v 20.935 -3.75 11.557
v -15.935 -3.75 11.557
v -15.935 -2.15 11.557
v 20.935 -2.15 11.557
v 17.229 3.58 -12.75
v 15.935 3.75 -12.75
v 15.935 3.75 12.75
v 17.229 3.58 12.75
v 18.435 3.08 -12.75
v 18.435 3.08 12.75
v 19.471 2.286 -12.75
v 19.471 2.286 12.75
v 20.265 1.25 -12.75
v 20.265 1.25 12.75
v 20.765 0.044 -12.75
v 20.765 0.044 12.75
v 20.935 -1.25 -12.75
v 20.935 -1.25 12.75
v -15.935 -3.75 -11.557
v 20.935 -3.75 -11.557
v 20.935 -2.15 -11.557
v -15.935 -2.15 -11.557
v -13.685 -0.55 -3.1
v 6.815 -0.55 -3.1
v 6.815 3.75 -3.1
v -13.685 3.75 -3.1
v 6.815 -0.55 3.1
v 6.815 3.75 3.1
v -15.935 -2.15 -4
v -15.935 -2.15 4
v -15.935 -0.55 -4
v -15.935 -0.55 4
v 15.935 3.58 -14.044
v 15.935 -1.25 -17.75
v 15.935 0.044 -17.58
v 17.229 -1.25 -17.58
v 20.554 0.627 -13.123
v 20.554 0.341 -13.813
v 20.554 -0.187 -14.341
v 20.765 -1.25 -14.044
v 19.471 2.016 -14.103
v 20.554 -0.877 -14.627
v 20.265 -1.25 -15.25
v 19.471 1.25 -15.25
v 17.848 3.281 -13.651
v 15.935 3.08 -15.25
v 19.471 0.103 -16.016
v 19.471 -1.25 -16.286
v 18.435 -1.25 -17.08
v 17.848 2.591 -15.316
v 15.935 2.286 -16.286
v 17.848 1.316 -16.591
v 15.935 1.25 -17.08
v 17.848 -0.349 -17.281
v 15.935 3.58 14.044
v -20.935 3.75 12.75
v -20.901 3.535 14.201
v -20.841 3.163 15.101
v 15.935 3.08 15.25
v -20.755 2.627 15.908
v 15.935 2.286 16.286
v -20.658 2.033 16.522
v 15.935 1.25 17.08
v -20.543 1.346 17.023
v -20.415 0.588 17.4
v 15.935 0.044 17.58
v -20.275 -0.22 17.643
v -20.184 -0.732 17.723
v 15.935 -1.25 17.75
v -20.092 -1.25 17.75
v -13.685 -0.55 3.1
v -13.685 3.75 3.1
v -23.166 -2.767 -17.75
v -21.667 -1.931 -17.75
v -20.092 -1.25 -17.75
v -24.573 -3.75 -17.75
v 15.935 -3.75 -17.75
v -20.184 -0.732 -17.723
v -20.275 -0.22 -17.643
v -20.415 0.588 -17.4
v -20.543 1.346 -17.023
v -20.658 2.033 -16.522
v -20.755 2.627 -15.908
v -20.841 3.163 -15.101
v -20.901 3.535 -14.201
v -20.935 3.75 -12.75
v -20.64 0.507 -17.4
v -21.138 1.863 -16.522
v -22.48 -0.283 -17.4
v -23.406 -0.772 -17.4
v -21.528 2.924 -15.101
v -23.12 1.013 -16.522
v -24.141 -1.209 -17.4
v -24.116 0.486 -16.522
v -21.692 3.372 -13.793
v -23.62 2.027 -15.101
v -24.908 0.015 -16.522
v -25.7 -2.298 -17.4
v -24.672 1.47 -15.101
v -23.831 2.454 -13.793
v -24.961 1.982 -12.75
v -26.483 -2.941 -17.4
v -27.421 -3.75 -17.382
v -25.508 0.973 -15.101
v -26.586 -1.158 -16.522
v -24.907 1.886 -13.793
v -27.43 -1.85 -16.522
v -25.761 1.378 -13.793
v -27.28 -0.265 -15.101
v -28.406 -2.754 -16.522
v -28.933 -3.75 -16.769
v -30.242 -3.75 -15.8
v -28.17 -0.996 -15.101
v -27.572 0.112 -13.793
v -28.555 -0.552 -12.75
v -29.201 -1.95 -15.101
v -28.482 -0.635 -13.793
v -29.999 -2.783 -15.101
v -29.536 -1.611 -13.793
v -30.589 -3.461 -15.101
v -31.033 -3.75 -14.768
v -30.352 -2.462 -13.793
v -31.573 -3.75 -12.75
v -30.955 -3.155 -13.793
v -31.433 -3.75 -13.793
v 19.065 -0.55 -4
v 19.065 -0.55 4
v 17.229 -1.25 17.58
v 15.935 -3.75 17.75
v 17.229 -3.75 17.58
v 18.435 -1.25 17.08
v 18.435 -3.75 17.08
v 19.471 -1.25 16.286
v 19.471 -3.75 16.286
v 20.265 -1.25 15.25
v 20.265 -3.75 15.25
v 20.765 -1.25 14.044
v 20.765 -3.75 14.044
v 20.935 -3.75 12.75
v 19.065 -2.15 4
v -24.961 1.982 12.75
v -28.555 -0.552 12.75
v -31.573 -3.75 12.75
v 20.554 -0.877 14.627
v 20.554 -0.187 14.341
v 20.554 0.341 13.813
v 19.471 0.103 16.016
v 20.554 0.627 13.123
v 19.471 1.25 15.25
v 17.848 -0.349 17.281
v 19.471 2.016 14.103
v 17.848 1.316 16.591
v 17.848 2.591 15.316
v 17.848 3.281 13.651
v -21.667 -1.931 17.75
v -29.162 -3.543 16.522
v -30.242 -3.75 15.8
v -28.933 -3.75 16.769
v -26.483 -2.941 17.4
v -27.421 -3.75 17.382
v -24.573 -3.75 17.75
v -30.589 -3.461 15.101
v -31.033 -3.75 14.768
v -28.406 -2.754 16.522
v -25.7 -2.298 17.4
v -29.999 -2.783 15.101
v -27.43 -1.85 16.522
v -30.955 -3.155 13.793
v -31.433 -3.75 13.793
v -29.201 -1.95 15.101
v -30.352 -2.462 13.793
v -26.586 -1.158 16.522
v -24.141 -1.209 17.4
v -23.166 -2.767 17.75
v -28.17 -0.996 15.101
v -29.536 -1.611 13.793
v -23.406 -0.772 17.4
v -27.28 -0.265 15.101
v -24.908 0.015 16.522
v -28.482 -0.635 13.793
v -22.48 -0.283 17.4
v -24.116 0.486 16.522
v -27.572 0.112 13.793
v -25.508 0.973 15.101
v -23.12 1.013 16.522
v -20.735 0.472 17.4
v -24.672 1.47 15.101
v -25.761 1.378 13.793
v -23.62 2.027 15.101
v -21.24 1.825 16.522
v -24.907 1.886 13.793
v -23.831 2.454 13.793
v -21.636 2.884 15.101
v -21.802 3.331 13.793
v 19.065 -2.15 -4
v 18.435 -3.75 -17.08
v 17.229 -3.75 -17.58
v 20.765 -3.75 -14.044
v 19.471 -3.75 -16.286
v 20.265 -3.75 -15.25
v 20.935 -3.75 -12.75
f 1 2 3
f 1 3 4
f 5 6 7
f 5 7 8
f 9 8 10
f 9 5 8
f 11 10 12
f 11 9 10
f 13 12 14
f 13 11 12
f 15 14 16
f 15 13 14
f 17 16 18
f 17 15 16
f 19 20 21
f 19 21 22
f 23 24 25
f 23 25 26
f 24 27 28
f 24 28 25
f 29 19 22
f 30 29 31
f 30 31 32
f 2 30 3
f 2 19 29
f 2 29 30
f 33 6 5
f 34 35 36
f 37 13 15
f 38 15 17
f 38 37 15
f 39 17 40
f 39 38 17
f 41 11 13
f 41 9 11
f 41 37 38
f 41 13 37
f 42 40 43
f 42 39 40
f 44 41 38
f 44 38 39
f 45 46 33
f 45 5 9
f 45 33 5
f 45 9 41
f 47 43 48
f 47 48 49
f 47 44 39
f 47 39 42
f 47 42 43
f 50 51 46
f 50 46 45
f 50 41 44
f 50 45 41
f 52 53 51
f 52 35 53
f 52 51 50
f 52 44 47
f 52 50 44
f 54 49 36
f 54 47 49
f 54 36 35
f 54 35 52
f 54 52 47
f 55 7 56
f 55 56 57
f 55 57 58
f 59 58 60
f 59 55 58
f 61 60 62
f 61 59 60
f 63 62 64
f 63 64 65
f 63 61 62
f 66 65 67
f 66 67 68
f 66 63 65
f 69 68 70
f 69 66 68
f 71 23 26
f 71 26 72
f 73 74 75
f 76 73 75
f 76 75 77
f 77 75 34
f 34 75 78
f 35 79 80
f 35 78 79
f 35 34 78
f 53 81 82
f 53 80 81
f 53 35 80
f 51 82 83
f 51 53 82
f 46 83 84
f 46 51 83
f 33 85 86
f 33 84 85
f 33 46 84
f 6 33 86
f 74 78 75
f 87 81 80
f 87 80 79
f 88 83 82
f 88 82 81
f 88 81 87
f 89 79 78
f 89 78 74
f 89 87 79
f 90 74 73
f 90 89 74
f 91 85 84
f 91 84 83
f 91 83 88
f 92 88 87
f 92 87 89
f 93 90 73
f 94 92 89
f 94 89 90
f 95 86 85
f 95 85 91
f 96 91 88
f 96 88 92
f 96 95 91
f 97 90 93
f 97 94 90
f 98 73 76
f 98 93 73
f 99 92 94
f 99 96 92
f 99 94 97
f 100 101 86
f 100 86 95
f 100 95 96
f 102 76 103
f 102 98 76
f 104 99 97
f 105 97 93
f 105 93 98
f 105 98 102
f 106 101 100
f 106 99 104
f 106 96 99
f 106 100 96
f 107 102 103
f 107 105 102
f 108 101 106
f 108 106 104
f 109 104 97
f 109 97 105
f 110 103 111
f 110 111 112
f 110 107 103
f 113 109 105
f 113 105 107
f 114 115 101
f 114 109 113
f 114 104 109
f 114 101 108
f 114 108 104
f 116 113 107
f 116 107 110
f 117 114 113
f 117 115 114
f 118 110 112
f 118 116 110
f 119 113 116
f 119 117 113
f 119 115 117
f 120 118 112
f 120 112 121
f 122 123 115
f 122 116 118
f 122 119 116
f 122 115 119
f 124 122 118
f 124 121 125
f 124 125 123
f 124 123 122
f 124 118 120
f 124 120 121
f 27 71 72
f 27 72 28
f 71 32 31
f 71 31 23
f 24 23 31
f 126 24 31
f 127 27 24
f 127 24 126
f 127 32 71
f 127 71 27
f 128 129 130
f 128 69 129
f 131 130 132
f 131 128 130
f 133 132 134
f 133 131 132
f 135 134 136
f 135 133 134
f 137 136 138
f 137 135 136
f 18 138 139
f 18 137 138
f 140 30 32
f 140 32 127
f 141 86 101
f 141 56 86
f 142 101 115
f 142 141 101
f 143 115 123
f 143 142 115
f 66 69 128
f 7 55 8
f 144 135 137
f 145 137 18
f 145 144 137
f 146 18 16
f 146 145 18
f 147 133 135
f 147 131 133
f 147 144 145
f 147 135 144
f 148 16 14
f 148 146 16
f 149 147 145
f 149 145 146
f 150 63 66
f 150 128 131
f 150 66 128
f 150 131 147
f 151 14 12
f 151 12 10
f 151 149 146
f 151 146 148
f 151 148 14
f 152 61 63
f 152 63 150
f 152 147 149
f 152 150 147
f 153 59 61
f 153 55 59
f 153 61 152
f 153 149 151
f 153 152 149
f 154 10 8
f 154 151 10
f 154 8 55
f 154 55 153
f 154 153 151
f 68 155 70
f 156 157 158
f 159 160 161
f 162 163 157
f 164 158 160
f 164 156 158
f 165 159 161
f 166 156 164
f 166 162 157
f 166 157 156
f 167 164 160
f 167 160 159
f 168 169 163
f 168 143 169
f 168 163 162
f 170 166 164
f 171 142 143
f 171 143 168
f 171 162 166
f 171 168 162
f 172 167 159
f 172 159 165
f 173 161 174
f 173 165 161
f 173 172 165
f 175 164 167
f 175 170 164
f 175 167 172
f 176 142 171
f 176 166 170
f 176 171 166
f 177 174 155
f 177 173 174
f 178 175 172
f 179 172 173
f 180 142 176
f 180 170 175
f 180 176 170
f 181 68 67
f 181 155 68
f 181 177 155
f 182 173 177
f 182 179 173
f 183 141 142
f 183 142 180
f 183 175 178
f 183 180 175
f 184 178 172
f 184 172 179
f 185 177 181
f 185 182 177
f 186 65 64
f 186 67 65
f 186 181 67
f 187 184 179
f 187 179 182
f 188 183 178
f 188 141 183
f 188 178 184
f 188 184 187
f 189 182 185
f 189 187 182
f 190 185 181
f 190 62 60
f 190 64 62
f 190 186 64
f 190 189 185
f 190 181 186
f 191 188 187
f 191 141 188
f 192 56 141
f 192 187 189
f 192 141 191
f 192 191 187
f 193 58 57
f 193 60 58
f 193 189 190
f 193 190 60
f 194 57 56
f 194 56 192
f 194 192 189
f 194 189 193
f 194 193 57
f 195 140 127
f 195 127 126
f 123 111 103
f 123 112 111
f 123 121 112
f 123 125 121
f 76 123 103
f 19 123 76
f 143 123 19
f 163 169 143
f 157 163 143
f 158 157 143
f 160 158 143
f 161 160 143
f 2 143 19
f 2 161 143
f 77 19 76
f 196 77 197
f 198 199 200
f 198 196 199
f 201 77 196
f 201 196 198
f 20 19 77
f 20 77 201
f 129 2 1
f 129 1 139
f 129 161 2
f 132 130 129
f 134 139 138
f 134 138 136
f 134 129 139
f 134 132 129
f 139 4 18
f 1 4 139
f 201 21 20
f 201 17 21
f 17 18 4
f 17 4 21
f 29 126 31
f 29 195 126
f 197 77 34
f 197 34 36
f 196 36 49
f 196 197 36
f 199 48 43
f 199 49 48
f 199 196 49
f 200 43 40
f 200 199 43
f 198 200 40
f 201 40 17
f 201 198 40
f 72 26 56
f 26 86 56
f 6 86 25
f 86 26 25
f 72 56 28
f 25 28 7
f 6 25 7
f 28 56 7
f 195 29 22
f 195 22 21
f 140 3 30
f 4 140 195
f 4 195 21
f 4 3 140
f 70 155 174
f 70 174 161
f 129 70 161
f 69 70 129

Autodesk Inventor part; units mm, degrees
ref_plane "YZ Plane" through (0, 0, 0) normal (1, 0, 0) x (0, 1, 0)
ref_plane "XZ Plane" through (0, 0, 0) normal (0, 1, 0) x (-1, 0, 0)
ref_plane "XY Plane" through (0, 0, 0) normal (0, 0, 1) x (1, 0, 0)
sketch "Sketch1" plane through (0, 0, 0) normal (0, 0, 1) x (1, 0, 0)
  line L0 (-20.935, 3.75) -> (20.935, 3.75)
  line L1 (20.935, 3.75) -> (20.935, -3.75)
  line L2 (20.935, -3.75) -> (-20.935, -3.75)
  line L3 (-20.935, -3.75) -> (-20.935, 3.75)
  line L4 (-20.935, 3.75) -> (20.935, -3.75) construction
  line L5 (20.935, 3.75) -> (-20.935, -3.75) construction
  point P0 (0, 0)
  dimension "d0" = 41.87
  dimension "d1" = 7.5
extrude "Extrusion1" add sketch "Sketch1" along normal mid plane 35.5
sketch "Sketch2" plane through (-20.935, -3.75, 17.75) normal (0, -1, 0) x (1, 0, 0)
  line L0 (0, -35.5) -> (0, 0) projected
  line L1 (0, -35.5) -> (0, -29.307)
  line L2 (0, -29.307) -> (5, -29.307)
  line L3 (5, -29.307) -> (5, -6.193)
  line L4 (5, -6.193) -> (41.87, -6.193)
  line L5 (41.87, -6.193) -> (41.87, -29.307)
  line L6 (41.87, -29.307) -> (5, -29.307)
  point P0 (20.935, -17.75)
  dimension "d4" = 6.193
  dimension "d5" = 5
  dimension "d6" = 23.114
  dimension "d7" = 36.87
extrude "Extrusion2" cut sketch "Sketch2" against normal blind 1.6
sketch "Sketch3" plane through (-20.935, -2.15, 17.75) normal (0, -1, 0) x (1, 0, 0)
  line L0 (5, -29.307) -> (5, -6.193) projected
  line L1 (5, -29.307) -> (5, -21.75)
  line L2 (5, -21.75) -> (5, -13.75)
  line L3 (5, -13.75) -> (40, -13.75)
  line L4 (40, -13.75) -> (40, -21.75)
  line L5 (40, -21.75) -> (5, -21.75)
  point P0 (20.935, -17.75)
  dimension "d10" = 7.557
  dimension "d11" = 8
  dimension "d12" = 35
extrude "Extrusion3" cut sketch "Sketch3" against normal blind 1.6
fillet "Fillet1" radius 5 2 edges at (0, 3.75, 17.75) (0, 3.75, -17.75)
fillet "Fillet2" radius 5 5 edges at (20.935, 2.2855, -16.2855) (20.935, -2.5, -17.75) (20.935, 2.2855, 16.2855) (20.935, -2.5, 17.75) (20.935, 3.75, 0)
sketch "Sketch5" plane through (-20.935, -0.55, 17.75) normal (0, -1, 0) x (1, 0, 0)
  line L0 (5, -29.307) -> (5, -21.75) projected
  line L1 (5, -21.75) -> (5, -20.85)
  line L2 (5, -29.307) -> (5, -6.193) projected
  line L3 (5, -20.85) -> (7.25, -20.85)
  line L4 (7.25, -20.85) -> (7.25, -14.65)
  line L5 (7.25, -14.65) -> (27.75, -14.65)
  line L6 (27.75, -14.65) -> (27.75, -20.85)
  line L7 (27.75, -20.85) -> (7.25, -20.85)
  point P0 (20.935, -17.75)
  dimension "d22" = 0.9
  dimension "d23" = 2.25
  dimension "d24" = 6.2
  dimension "d25" = 20.5
extrude "Extrusion5" cut sketch "Sketch5" against normal through all
sketch "Sketch6" plane through (-20.935, -3.75, -17.75) normal (0, -1, 0) x (1, 0, 0)
  line L0 (0, 0) -> (0, 35.5) projected
  line L1 (0, 35.5) -> (-15, 35.5)
  line L2 (-15, 35.5) -> (-15, 0)
  line L3 (-15, 0) -> (0, 0)
  line L4 (0, 0) -> (0, 35.5)
  point P0 (20.935, 17.75)
  dimension "d28" = 15
  dimension "d29" = 35.5
extrude "Extrusion6" add sketch "Sketch6" against normal blind 7.5
fillet "Fillet3" [suppressed]
sketch "Sketch7" plane through (0, 0, 17.75) normal (0, 0, 1) x (1, 0, 0)
  line L0 (-20.9589, -1.4001) -> (-20.9589, -3.75)
  line L1 (15.935, -3.75) -> (-35.935, -3.75) projected
  line L2 (-35.935, -3.75) -> (-20.9589, -3.75)
  line L3 (-20.9589, -3.75) -> (-20.9589, -14.15)
  line L4 (-20.9589, -14.15) -> (-35.935, -14.15)
  line L5 (-35.935, -14.15) -> (-35.935, -3.75)
  point P0 (0, 0)
  dimension "d33" = 10.4
extrude "Extrusion7" add sketch "Sketch7" against normal blind 35.5
sketch "Sketch8" plane through (0, 0, 17.75) normal (0, 0, 1) x (1, 0, 0)
  line L0 (-35.935, 3.75) -> (-35.935, -14.15) projected
  line L1 (-35.935, 3.75) -> (-20.935, 3.75) projected
  arc A0 (-20.935, 3.75) -> (-35.935, -14.15) centre (-14.1441, -17.1757) ccw
  line L2 (-35.935, -14.15) -> (-35.935, 3.75)
  point P0 (0, 0)
  dimension "d36" = 22
extrude "Extrusion8" cut sketch "Sketch8" against normal through all
sketch "Sketch9" plane through (0, 0, 17.75) normal (0, 0, 1) x (1, 0, 0)
  line L0 (-20.9589, -3.75) -> (-20.9589, -14.15) projected
  line L1 (-20.9589, -3.75) -> (-37.0076, -3.75)
  line L2 (-37.0076, -3.75) -> (-37.0076, -16.8891)
  line L3 (-37.0076, -16.8891) -> (-20.9589, -16.8891)
  line L4 (-20.9589, -16.8891) -> (-20.9589, -3.75)
  point P0 (0, 0)
extrude "Extrusion9" cut sketch "Sketch9" against normal through all
fillet "Fillet4" radius 5 2 edges at (-26.8211, 0.8047, 17.75) (-26.8211, 0.8047, -17.75)
properties part number "Case - Top"
